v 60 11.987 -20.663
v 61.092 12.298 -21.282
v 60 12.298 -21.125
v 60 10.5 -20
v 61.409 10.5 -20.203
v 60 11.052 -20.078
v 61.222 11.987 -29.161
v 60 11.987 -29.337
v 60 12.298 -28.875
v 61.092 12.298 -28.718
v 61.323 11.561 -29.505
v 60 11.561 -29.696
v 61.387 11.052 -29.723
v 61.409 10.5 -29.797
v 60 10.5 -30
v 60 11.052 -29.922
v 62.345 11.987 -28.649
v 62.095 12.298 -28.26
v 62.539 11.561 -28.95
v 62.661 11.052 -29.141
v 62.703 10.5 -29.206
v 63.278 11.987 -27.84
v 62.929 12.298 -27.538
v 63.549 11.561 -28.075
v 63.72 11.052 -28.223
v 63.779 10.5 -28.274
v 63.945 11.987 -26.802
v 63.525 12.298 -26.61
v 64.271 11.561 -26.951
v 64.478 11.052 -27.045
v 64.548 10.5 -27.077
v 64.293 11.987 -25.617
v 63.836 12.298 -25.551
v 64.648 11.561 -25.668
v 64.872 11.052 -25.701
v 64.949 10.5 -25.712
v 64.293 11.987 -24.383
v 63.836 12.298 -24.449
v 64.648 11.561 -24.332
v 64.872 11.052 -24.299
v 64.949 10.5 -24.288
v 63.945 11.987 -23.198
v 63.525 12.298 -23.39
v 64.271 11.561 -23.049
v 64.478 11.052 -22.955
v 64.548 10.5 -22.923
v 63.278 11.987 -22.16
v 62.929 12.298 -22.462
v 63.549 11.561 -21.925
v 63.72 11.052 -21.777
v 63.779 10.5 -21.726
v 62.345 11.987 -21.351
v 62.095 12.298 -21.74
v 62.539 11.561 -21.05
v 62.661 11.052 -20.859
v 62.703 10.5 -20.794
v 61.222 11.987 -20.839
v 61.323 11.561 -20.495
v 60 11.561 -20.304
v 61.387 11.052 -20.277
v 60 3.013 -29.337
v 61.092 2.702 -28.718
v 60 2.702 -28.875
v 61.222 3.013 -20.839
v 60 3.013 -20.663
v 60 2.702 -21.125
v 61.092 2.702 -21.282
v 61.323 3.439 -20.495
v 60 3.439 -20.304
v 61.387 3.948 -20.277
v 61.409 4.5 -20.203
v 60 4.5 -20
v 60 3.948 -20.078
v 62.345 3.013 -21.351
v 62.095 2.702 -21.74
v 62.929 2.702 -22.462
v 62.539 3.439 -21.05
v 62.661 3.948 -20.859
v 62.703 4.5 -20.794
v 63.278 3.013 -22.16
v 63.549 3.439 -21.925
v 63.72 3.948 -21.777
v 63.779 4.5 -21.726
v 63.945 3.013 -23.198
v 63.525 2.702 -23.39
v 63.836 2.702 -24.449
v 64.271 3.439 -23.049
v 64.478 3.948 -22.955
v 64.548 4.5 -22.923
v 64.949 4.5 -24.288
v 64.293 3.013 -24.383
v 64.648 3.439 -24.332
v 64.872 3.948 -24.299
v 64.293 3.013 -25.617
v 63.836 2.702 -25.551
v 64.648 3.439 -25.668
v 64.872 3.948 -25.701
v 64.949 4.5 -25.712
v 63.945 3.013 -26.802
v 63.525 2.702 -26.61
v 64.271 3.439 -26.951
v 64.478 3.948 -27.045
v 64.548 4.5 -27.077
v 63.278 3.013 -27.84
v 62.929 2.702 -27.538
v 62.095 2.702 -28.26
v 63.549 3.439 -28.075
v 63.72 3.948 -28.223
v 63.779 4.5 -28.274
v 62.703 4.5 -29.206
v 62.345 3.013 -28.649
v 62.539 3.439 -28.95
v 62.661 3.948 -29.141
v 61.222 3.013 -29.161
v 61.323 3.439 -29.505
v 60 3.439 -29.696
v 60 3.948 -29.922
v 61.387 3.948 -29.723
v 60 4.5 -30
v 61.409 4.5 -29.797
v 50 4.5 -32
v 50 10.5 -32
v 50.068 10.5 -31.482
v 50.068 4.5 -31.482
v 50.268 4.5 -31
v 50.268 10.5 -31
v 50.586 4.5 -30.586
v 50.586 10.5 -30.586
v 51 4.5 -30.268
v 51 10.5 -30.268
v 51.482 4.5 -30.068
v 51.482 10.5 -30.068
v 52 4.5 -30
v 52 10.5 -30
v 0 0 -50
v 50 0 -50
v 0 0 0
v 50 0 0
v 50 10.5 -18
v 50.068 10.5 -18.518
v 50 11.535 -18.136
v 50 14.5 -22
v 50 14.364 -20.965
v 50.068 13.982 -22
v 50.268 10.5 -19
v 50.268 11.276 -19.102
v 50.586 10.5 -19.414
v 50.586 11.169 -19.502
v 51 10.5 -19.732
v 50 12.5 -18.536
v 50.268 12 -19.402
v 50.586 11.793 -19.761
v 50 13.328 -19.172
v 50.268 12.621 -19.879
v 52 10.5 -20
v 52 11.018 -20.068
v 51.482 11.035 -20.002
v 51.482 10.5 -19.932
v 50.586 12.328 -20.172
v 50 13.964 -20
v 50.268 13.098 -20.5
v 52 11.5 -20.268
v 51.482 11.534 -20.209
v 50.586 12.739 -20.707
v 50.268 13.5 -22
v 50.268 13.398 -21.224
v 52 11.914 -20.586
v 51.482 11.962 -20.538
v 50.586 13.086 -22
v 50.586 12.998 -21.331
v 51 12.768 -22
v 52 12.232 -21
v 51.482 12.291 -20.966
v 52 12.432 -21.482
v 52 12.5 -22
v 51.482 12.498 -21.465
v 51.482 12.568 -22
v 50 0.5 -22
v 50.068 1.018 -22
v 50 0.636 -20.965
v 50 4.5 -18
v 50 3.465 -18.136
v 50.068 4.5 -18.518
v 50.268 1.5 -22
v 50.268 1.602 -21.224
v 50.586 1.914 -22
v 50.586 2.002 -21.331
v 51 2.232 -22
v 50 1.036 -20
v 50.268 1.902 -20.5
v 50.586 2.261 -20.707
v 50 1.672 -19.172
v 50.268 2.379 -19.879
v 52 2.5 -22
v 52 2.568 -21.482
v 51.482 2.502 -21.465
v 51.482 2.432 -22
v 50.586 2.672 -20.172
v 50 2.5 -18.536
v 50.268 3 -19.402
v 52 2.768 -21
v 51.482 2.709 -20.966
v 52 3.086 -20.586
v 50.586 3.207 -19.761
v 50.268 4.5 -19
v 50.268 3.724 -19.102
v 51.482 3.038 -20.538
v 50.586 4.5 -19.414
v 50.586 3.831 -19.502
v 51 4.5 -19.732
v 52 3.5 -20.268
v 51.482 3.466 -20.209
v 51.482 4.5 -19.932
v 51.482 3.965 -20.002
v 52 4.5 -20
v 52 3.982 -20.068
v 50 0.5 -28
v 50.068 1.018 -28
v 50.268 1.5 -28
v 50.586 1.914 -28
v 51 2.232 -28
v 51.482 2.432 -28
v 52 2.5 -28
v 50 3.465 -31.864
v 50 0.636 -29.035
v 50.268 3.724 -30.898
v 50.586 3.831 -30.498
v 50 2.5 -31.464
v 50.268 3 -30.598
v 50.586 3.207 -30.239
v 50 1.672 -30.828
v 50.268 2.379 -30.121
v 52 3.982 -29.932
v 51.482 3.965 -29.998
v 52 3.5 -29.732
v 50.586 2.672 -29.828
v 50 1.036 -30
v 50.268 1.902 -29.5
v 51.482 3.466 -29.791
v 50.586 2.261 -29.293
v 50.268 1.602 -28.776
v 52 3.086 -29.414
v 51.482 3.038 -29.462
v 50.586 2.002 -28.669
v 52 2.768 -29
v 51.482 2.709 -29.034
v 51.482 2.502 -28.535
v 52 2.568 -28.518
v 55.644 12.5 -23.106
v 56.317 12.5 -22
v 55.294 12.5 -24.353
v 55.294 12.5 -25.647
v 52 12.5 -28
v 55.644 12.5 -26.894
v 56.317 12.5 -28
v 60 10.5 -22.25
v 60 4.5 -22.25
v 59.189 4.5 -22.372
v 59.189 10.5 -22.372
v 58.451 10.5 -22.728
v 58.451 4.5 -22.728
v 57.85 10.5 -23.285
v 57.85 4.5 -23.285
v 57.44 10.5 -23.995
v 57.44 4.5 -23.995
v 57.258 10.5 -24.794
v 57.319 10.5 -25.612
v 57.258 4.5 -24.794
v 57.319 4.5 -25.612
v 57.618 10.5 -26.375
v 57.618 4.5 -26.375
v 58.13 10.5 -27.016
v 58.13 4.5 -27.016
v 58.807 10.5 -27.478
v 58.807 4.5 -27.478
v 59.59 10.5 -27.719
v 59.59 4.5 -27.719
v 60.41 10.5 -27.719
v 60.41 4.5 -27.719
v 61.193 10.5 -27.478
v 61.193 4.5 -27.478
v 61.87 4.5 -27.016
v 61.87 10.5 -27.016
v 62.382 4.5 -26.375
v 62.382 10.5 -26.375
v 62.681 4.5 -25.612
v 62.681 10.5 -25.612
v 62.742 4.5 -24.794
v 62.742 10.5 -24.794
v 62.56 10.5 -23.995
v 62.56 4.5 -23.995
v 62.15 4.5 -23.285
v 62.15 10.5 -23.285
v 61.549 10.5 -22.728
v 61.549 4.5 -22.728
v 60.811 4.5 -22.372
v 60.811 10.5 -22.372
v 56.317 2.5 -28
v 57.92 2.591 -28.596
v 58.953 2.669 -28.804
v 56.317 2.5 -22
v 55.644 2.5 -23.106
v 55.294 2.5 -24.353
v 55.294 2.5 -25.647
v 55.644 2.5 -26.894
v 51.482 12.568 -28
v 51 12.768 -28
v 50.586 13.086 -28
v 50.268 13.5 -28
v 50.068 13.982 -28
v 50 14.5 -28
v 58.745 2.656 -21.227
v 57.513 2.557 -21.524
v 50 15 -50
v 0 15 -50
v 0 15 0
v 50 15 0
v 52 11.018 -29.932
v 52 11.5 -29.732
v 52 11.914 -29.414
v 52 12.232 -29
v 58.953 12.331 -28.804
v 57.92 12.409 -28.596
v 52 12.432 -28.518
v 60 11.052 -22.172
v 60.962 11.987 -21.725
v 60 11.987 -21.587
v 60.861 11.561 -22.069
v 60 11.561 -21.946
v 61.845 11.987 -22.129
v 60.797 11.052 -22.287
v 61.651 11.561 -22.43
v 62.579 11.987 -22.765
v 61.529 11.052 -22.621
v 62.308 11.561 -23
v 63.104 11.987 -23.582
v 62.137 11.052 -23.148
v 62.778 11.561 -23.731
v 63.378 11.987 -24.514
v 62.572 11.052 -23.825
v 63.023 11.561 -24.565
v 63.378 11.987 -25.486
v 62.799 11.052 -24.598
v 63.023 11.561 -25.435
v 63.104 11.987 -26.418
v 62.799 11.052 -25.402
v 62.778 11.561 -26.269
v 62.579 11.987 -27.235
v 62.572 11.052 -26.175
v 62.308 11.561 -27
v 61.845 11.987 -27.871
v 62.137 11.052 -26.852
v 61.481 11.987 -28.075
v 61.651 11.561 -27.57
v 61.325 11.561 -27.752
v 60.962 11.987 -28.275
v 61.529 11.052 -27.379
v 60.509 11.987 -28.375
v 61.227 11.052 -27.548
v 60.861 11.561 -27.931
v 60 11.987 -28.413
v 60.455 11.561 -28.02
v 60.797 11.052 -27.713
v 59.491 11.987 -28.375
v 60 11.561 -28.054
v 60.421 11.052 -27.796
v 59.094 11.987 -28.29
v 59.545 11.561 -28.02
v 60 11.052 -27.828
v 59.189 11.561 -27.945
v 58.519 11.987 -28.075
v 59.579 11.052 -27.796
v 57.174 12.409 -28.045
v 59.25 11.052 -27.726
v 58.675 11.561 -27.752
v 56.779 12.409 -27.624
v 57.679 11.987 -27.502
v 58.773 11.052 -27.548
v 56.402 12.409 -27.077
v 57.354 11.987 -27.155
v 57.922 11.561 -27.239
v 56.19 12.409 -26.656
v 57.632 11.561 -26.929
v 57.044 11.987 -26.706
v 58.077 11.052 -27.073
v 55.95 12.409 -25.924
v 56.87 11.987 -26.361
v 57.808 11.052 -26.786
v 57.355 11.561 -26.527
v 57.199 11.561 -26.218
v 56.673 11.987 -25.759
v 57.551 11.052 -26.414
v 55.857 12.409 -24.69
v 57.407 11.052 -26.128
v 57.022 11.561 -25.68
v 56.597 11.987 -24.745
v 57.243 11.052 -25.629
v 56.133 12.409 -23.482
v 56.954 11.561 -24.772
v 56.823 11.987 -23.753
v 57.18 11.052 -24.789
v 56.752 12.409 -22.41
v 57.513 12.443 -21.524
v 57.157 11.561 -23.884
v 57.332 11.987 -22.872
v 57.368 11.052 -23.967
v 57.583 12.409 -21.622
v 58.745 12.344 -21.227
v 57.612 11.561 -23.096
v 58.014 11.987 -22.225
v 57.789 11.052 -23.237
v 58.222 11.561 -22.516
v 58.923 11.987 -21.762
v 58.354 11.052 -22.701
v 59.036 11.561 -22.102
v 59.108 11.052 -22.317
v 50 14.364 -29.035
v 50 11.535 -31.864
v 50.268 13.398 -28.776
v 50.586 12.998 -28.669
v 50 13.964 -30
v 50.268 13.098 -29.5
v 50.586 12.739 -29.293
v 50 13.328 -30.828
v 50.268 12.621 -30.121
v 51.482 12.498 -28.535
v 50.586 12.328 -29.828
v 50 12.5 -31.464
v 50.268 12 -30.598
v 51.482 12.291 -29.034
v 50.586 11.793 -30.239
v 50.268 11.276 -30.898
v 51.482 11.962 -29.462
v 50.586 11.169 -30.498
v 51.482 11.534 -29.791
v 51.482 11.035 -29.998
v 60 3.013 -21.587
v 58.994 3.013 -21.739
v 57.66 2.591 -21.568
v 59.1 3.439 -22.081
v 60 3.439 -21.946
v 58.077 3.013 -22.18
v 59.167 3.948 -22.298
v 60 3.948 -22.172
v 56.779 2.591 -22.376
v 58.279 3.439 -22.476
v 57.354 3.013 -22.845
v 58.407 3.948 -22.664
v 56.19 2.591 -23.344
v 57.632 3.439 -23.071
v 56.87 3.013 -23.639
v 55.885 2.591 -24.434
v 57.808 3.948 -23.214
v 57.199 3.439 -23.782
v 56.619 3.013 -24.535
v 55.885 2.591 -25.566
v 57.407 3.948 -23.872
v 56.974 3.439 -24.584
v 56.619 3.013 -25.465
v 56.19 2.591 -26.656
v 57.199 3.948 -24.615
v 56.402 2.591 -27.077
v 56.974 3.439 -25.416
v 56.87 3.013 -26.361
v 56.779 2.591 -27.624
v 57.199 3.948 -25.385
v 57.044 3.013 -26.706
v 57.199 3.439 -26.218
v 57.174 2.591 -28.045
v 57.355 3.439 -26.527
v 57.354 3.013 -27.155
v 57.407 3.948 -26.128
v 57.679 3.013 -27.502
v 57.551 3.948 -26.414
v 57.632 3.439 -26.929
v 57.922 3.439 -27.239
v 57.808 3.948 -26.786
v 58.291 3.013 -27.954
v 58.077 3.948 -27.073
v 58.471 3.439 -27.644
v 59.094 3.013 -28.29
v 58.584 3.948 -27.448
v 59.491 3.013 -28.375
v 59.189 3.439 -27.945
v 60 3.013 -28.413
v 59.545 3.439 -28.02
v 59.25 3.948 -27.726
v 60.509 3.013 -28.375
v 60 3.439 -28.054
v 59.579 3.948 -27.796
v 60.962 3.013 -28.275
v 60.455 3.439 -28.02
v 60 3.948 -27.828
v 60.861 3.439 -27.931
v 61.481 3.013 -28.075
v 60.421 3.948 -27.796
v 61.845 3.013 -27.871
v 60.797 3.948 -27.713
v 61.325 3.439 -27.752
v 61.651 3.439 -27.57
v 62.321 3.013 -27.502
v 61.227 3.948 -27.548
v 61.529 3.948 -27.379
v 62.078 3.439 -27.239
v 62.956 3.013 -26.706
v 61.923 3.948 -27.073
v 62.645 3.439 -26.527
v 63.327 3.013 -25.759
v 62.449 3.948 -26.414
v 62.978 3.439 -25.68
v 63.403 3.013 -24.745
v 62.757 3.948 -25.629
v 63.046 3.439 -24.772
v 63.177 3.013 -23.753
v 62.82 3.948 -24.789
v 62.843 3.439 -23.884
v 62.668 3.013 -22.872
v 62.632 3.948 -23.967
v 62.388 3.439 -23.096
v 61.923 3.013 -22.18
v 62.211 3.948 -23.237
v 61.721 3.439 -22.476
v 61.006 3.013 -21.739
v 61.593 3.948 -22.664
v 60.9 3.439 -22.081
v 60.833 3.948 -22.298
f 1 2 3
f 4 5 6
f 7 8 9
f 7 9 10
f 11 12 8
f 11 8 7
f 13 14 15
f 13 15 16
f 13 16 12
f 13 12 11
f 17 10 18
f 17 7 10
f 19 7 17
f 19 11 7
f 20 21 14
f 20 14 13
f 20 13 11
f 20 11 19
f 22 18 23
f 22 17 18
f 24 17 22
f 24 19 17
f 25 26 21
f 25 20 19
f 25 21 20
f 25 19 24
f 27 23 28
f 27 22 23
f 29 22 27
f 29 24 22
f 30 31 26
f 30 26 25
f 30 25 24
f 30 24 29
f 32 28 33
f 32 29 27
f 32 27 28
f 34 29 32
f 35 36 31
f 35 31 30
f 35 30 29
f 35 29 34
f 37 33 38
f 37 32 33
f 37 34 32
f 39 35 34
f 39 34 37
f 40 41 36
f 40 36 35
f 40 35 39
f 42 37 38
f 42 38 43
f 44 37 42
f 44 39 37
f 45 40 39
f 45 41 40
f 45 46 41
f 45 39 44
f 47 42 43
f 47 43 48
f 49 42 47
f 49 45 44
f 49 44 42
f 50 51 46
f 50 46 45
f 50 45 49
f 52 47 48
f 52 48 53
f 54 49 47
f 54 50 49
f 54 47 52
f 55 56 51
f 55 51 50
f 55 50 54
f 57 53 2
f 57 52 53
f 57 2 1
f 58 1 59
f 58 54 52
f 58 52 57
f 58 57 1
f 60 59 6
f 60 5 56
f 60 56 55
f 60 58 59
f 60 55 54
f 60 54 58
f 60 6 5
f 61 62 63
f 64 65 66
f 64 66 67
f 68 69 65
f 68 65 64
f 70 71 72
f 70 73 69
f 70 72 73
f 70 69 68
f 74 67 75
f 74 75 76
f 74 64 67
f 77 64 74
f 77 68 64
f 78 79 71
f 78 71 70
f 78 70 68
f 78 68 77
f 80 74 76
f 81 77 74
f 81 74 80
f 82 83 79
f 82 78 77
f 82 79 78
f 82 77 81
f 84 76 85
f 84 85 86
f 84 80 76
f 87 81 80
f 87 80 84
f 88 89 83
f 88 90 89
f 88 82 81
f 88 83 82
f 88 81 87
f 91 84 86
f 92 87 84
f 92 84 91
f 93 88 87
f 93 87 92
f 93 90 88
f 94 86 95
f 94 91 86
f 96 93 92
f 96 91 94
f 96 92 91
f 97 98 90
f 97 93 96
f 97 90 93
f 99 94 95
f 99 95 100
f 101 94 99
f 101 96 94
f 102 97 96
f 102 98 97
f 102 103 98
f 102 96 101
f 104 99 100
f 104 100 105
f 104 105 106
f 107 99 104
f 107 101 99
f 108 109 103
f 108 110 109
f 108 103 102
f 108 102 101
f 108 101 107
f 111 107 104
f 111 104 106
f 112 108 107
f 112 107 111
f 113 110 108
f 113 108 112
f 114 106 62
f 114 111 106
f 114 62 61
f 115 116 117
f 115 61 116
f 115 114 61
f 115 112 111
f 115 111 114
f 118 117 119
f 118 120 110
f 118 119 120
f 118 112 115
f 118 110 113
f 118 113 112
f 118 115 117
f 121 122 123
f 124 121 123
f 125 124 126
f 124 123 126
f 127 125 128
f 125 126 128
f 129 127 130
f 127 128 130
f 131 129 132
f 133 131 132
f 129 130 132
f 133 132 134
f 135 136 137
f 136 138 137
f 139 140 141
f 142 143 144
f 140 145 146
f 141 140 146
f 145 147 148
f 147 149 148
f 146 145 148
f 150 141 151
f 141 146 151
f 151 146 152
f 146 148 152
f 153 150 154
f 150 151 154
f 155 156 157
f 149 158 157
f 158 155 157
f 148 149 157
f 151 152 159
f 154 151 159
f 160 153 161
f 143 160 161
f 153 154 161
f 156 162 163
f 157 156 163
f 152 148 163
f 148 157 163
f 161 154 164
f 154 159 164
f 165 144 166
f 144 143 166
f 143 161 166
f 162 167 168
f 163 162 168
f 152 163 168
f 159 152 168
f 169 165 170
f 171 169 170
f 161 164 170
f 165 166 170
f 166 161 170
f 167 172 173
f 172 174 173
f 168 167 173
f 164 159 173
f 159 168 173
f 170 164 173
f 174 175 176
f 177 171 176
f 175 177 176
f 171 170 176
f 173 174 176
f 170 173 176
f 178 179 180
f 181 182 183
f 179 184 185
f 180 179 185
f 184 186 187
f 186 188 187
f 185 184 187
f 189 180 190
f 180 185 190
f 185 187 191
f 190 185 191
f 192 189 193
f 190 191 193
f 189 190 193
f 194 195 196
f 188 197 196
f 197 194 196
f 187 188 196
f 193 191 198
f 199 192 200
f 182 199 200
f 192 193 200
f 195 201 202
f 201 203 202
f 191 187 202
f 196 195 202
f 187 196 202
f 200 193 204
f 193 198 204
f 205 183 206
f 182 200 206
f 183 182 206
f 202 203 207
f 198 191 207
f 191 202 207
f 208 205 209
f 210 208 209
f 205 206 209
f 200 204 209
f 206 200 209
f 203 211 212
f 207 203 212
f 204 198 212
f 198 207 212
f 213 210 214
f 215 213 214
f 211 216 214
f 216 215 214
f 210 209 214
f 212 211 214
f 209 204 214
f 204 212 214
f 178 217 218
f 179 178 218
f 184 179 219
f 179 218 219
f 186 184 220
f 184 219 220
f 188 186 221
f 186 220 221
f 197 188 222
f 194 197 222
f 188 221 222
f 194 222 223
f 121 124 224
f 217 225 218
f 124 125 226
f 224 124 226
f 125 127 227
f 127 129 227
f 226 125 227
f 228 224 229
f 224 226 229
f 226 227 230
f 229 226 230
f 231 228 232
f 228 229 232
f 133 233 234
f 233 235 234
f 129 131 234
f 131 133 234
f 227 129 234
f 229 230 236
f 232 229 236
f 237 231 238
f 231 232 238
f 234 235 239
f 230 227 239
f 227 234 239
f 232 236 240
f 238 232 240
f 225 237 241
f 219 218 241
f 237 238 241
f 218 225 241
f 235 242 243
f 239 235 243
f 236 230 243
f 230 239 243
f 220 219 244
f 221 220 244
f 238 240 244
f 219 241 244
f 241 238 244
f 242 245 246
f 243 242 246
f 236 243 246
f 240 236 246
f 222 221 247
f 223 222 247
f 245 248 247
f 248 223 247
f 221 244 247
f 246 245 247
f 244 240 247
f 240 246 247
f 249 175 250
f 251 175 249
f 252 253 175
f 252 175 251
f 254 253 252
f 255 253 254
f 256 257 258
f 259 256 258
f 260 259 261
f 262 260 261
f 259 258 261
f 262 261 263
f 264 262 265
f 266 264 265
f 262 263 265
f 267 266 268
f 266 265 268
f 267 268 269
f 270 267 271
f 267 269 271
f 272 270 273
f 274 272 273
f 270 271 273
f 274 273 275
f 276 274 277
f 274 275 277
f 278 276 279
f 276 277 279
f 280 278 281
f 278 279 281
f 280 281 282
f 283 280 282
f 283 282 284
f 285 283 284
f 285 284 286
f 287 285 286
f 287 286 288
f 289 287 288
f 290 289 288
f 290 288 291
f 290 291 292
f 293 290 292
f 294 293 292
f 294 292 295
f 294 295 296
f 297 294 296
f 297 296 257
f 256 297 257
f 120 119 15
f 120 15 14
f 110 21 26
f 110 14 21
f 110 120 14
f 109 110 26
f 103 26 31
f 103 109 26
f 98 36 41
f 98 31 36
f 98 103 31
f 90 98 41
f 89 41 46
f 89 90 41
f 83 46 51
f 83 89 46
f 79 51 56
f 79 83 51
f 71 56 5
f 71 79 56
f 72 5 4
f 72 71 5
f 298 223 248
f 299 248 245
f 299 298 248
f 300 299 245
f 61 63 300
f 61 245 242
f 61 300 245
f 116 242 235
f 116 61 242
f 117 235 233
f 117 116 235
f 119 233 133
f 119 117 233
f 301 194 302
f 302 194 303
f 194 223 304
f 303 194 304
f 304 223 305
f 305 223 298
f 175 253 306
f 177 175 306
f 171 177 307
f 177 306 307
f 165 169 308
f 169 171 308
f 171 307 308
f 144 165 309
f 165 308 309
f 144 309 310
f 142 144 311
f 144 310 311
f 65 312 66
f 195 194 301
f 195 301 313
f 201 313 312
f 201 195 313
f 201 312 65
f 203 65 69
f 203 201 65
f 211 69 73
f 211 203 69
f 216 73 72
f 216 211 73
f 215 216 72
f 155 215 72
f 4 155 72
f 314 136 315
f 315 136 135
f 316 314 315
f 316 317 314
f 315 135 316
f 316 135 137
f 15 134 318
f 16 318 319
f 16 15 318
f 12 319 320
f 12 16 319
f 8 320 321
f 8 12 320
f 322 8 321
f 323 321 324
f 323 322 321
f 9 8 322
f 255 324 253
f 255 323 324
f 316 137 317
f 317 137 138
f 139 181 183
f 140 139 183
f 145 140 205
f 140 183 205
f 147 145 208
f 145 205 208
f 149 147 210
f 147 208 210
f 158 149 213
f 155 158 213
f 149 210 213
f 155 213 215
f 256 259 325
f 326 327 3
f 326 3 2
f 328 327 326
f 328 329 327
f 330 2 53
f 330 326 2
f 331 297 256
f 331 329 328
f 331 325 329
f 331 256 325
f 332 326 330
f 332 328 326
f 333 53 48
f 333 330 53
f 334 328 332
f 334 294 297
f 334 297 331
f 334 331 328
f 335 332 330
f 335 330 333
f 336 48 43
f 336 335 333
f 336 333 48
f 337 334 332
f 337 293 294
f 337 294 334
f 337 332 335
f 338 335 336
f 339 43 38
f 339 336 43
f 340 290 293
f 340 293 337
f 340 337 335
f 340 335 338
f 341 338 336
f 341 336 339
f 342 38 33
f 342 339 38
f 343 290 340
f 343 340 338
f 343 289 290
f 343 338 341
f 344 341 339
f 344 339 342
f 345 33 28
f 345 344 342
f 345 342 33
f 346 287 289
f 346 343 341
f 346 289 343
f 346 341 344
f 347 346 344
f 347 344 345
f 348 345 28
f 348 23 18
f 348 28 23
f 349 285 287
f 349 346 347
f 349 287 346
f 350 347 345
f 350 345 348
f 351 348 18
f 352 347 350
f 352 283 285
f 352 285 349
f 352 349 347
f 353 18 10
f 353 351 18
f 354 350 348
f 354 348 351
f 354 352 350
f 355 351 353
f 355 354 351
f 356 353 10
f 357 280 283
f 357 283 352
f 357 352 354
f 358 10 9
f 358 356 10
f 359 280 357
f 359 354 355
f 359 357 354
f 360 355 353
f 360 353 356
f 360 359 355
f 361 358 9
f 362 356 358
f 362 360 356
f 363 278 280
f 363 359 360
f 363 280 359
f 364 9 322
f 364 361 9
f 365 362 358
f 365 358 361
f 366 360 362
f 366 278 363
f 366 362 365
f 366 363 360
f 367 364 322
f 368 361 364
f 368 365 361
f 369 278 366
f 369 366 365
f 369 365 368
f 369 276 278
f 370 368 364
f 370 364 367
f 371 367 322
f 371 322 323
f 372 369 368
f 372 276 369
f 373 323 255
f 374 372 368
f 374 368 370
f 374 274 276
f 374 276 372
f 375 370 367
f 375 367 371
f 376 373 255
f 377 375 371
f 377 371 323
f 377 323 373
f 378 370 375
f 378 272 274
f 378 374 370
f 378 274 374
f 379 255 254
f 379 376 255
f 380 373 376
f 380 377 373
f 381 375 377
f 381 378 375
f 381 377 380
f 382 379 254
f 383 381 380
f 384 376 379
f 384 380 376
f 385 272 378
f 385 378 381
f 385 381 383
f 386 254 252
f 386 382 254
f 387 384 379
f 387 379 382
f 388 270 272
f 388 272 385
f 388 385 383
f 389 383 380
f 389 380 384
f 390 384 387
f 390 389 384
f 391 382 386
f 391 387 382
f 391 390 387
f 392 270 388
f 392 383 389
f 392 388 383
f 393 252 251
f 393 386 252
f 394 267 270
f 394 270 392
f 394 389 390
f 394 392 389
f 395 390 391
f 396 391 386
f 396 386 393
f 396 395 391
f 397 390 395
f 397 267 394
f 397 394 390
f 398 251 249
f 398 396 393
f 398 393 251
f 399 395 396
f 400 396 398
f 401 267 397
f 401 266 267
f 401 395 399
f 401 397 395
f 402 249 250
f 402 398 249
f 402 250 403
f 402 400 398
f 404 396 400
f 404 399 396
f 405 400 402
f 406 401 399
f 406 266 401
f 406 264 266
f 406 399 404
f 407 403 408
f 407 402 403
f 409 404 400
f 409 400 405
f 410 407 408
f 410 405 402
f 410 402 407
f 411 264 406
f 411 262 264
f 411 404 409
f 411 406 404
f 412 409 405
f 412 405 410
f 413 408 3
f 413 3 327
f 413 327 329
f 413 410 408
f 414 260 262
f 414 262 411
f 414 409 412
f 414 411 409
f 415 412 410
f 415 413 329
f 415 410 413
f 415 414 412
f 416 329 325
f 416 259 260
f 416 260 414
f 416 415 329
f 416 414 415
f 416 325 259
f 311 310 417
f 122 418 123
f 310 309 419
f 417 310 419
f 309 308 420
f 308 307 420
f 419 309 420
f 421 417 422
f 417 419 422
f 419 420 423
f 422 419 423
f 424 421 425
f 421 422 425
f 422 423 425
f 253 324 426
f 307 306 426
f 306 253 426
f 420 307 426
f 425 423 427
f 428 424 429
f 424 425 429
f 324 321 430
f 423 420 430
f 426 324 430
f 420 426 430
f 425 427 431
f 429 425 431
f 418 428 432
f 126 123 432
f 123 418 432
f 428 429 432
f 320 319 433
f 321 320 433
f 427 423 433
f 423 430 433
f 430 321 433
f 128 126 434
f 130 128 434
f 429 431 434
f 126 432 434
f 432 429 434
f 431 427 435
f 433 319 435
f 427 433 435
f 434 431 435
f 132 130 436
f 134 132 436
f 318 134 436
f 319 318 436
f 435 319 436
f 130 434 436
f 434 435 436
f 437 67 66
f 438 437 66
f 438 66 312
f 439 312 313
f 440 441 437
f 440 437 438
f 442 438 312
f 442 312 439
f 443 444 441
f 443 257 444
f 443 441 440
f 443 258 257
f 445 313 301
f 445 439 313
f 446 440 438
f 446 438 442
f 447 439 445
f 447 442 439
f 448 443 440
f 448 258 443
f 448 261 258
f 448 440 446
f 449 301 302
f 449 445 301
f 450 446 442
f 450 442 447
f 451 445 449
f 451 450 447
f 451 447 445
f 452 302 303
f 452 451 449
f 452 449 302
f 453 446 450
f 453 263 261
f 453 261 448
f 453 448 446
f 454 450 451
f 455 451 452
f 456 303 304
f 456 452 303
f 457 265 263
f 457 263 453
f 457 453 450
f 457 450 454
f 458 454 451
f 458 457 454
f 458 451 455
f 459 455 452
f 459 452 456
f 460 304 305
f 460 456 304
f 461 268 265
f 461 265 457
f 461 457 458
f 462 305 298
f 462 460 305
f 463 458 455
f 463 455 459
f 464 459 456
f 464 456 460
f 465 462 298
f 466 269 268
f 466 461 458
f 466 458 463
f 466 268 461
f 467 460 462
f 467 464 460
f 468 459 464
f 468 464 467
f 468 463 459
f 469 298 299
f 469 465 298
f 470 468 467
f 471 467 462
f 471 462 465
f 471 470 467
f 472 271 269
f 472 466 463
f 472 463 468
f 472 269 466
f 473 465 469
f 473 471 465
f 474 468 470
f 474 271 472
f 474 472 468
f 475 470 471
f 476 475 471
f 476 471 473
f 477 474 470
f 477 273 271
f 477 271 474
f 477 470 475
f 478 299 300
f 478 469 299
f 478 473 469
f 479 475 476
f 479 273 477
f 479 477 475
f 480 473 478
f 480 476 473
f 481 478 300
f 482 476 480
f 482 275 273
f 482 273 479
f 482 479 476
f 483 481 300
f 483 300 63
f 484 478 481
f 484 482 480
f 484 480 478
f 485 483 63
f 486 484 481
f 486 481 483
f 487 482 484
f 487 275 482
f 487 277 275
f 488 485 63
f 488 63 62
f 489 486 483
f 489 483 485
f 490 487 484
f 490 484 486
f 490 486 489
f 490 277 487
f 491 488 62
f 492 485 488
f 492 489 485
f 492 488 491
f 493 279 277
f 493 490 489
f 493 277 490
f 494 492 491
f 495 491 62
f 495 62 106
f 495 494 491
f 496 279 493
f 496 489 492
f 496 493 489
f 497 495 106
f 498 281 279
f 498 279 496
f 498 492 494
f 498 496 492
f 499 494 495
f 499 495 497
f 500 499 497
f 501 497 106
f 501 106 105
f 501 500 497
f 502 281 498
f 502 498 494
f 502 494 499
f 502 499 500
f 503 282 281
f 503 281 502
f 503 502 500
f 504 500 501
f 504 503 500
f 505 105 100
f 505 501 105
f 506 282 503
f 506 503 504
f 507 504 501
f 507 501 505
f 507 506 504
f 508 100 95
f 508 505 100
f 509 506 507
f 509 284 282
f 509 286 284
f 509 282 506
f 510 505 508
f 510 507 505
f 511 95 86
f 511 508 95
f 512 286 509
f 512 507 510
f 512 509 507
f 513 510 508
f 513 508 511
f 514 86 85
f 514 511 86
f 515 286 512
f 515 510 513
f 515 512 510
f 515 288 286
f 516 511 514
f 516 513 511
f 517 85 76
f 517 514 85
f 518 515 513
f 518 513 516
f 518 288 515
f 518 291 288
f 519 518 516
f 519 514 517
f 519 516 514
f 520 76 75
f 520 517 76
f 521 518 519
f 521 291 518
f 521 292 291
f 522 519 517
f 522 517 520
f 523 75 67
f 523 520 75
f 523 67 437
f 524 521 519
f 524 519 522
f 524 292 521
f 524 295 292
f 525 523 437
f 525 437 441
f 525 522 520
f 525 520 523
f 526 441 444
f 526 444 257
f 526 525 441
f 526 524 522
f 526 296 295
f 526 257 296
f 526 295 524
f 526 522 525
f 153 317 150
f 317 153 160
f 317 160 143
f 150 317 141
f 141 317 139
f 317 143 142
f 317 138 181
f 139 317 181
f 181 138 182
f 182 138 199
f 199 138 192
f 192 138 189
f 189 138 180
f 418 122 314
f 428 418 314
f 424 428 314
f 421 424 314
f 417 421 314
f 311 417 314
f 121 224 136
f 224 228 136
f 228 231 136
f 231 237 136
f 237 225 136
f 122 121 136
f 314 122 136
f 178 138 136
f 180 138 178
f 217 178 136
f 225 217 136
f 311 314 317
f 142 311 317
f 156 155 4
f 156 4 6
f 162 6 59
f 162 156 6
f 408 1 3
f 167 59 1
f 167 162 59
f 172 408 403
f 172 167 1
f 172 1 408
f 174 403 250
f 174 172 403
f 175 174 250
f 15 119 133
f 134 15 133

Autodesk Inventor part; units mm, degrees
ref_plane "YZ Plane" through (0, 0, 0) normal (1, 0, 0) x (0, 1, 0)
ref_plane "XZ Plane" through (0, 0, 0) normal (0, 1, 0) x (-1, 0, 0)
ref_plane "XY Plane" through (0, 0, 0) normal (0, 0, 1) x (1, 0, 0)
sketch "Sketch1" plane through (0, 0, 0) normal (0, 1, 0) x (-1, 0, 0)
  line L0 (0, 0) -> (-50, 0)
  line L1 (-50, 0) -> (-50, -50)
  line L2 (-50, -50) -> (0, -50)
  line L3 (0, -50) -> (0, 0)
  dimension "d0" = 50
  dimension "d1" = 50
extrude "Extrusion1" add sketch "Sketch1" along normal blind 15
ref_plane "Work Plane1" through (0, 7.5, 0) normal (0, 1, 0) x (1, 0, 0)
sketch "Sketch2" plane through (0, 7.5, 0) normal (0, 1, 0) x (1, 0, 0)
  line L0 (50, 20) -> (60, 20)
  line L1 (60, 20) -> (60, 30) construction
  line L2 (60, 30) -> (50, 30)
  line L3 (50, 30) -> (50, 20)
  line L4 (50, 20) -> (60, 30) construction
  line L5 (60, 20) -> (50, 30) construction
  line L6 (50, 0) -> (50, 50) projected
  arc A0 (60, 20) -> (60, 30) centre (60, 25) ccw
  line L7 (50, 25) -> (60, 25) construction
  point P0 (0, 0)
  dimension "d4" = 10
  dimension "d5" = 10
extrude "Extrusion2" add sketch "Sketch2" along normal mid plane 10
sketch "Sketch3" plane through (0, 12.5, 0) normal (0, 1, 0) x (1, 0, 0)
  arc A0 (60, 20) -> (60, 30) centre (60, 25) ccw projected
  point P0 (0, 0)
hole "Hole1" at (60, 12.5, -25) direction (0, -1, 0) diameter 5.5 end through all clearance for "Countersunk Flat Head Screw ISO 2009/7046" size "M5" standard "ISO"
fillet "Fillet1" radius 2 12 edges at (55, 2.5, -20) (55, 2.5, -30) (65, 2.5, -25) (55, 12.5, -30) (55, 12.5, -20) (65, 12.5, -25) (60, 12.5, -27.75) (60, 2.5, -27.75) (50, 12.5, -25) (50, 7.5, -20) (50, 2.5, -25) (50, 7.5, -30)
properties part number "Casing_Part3"
